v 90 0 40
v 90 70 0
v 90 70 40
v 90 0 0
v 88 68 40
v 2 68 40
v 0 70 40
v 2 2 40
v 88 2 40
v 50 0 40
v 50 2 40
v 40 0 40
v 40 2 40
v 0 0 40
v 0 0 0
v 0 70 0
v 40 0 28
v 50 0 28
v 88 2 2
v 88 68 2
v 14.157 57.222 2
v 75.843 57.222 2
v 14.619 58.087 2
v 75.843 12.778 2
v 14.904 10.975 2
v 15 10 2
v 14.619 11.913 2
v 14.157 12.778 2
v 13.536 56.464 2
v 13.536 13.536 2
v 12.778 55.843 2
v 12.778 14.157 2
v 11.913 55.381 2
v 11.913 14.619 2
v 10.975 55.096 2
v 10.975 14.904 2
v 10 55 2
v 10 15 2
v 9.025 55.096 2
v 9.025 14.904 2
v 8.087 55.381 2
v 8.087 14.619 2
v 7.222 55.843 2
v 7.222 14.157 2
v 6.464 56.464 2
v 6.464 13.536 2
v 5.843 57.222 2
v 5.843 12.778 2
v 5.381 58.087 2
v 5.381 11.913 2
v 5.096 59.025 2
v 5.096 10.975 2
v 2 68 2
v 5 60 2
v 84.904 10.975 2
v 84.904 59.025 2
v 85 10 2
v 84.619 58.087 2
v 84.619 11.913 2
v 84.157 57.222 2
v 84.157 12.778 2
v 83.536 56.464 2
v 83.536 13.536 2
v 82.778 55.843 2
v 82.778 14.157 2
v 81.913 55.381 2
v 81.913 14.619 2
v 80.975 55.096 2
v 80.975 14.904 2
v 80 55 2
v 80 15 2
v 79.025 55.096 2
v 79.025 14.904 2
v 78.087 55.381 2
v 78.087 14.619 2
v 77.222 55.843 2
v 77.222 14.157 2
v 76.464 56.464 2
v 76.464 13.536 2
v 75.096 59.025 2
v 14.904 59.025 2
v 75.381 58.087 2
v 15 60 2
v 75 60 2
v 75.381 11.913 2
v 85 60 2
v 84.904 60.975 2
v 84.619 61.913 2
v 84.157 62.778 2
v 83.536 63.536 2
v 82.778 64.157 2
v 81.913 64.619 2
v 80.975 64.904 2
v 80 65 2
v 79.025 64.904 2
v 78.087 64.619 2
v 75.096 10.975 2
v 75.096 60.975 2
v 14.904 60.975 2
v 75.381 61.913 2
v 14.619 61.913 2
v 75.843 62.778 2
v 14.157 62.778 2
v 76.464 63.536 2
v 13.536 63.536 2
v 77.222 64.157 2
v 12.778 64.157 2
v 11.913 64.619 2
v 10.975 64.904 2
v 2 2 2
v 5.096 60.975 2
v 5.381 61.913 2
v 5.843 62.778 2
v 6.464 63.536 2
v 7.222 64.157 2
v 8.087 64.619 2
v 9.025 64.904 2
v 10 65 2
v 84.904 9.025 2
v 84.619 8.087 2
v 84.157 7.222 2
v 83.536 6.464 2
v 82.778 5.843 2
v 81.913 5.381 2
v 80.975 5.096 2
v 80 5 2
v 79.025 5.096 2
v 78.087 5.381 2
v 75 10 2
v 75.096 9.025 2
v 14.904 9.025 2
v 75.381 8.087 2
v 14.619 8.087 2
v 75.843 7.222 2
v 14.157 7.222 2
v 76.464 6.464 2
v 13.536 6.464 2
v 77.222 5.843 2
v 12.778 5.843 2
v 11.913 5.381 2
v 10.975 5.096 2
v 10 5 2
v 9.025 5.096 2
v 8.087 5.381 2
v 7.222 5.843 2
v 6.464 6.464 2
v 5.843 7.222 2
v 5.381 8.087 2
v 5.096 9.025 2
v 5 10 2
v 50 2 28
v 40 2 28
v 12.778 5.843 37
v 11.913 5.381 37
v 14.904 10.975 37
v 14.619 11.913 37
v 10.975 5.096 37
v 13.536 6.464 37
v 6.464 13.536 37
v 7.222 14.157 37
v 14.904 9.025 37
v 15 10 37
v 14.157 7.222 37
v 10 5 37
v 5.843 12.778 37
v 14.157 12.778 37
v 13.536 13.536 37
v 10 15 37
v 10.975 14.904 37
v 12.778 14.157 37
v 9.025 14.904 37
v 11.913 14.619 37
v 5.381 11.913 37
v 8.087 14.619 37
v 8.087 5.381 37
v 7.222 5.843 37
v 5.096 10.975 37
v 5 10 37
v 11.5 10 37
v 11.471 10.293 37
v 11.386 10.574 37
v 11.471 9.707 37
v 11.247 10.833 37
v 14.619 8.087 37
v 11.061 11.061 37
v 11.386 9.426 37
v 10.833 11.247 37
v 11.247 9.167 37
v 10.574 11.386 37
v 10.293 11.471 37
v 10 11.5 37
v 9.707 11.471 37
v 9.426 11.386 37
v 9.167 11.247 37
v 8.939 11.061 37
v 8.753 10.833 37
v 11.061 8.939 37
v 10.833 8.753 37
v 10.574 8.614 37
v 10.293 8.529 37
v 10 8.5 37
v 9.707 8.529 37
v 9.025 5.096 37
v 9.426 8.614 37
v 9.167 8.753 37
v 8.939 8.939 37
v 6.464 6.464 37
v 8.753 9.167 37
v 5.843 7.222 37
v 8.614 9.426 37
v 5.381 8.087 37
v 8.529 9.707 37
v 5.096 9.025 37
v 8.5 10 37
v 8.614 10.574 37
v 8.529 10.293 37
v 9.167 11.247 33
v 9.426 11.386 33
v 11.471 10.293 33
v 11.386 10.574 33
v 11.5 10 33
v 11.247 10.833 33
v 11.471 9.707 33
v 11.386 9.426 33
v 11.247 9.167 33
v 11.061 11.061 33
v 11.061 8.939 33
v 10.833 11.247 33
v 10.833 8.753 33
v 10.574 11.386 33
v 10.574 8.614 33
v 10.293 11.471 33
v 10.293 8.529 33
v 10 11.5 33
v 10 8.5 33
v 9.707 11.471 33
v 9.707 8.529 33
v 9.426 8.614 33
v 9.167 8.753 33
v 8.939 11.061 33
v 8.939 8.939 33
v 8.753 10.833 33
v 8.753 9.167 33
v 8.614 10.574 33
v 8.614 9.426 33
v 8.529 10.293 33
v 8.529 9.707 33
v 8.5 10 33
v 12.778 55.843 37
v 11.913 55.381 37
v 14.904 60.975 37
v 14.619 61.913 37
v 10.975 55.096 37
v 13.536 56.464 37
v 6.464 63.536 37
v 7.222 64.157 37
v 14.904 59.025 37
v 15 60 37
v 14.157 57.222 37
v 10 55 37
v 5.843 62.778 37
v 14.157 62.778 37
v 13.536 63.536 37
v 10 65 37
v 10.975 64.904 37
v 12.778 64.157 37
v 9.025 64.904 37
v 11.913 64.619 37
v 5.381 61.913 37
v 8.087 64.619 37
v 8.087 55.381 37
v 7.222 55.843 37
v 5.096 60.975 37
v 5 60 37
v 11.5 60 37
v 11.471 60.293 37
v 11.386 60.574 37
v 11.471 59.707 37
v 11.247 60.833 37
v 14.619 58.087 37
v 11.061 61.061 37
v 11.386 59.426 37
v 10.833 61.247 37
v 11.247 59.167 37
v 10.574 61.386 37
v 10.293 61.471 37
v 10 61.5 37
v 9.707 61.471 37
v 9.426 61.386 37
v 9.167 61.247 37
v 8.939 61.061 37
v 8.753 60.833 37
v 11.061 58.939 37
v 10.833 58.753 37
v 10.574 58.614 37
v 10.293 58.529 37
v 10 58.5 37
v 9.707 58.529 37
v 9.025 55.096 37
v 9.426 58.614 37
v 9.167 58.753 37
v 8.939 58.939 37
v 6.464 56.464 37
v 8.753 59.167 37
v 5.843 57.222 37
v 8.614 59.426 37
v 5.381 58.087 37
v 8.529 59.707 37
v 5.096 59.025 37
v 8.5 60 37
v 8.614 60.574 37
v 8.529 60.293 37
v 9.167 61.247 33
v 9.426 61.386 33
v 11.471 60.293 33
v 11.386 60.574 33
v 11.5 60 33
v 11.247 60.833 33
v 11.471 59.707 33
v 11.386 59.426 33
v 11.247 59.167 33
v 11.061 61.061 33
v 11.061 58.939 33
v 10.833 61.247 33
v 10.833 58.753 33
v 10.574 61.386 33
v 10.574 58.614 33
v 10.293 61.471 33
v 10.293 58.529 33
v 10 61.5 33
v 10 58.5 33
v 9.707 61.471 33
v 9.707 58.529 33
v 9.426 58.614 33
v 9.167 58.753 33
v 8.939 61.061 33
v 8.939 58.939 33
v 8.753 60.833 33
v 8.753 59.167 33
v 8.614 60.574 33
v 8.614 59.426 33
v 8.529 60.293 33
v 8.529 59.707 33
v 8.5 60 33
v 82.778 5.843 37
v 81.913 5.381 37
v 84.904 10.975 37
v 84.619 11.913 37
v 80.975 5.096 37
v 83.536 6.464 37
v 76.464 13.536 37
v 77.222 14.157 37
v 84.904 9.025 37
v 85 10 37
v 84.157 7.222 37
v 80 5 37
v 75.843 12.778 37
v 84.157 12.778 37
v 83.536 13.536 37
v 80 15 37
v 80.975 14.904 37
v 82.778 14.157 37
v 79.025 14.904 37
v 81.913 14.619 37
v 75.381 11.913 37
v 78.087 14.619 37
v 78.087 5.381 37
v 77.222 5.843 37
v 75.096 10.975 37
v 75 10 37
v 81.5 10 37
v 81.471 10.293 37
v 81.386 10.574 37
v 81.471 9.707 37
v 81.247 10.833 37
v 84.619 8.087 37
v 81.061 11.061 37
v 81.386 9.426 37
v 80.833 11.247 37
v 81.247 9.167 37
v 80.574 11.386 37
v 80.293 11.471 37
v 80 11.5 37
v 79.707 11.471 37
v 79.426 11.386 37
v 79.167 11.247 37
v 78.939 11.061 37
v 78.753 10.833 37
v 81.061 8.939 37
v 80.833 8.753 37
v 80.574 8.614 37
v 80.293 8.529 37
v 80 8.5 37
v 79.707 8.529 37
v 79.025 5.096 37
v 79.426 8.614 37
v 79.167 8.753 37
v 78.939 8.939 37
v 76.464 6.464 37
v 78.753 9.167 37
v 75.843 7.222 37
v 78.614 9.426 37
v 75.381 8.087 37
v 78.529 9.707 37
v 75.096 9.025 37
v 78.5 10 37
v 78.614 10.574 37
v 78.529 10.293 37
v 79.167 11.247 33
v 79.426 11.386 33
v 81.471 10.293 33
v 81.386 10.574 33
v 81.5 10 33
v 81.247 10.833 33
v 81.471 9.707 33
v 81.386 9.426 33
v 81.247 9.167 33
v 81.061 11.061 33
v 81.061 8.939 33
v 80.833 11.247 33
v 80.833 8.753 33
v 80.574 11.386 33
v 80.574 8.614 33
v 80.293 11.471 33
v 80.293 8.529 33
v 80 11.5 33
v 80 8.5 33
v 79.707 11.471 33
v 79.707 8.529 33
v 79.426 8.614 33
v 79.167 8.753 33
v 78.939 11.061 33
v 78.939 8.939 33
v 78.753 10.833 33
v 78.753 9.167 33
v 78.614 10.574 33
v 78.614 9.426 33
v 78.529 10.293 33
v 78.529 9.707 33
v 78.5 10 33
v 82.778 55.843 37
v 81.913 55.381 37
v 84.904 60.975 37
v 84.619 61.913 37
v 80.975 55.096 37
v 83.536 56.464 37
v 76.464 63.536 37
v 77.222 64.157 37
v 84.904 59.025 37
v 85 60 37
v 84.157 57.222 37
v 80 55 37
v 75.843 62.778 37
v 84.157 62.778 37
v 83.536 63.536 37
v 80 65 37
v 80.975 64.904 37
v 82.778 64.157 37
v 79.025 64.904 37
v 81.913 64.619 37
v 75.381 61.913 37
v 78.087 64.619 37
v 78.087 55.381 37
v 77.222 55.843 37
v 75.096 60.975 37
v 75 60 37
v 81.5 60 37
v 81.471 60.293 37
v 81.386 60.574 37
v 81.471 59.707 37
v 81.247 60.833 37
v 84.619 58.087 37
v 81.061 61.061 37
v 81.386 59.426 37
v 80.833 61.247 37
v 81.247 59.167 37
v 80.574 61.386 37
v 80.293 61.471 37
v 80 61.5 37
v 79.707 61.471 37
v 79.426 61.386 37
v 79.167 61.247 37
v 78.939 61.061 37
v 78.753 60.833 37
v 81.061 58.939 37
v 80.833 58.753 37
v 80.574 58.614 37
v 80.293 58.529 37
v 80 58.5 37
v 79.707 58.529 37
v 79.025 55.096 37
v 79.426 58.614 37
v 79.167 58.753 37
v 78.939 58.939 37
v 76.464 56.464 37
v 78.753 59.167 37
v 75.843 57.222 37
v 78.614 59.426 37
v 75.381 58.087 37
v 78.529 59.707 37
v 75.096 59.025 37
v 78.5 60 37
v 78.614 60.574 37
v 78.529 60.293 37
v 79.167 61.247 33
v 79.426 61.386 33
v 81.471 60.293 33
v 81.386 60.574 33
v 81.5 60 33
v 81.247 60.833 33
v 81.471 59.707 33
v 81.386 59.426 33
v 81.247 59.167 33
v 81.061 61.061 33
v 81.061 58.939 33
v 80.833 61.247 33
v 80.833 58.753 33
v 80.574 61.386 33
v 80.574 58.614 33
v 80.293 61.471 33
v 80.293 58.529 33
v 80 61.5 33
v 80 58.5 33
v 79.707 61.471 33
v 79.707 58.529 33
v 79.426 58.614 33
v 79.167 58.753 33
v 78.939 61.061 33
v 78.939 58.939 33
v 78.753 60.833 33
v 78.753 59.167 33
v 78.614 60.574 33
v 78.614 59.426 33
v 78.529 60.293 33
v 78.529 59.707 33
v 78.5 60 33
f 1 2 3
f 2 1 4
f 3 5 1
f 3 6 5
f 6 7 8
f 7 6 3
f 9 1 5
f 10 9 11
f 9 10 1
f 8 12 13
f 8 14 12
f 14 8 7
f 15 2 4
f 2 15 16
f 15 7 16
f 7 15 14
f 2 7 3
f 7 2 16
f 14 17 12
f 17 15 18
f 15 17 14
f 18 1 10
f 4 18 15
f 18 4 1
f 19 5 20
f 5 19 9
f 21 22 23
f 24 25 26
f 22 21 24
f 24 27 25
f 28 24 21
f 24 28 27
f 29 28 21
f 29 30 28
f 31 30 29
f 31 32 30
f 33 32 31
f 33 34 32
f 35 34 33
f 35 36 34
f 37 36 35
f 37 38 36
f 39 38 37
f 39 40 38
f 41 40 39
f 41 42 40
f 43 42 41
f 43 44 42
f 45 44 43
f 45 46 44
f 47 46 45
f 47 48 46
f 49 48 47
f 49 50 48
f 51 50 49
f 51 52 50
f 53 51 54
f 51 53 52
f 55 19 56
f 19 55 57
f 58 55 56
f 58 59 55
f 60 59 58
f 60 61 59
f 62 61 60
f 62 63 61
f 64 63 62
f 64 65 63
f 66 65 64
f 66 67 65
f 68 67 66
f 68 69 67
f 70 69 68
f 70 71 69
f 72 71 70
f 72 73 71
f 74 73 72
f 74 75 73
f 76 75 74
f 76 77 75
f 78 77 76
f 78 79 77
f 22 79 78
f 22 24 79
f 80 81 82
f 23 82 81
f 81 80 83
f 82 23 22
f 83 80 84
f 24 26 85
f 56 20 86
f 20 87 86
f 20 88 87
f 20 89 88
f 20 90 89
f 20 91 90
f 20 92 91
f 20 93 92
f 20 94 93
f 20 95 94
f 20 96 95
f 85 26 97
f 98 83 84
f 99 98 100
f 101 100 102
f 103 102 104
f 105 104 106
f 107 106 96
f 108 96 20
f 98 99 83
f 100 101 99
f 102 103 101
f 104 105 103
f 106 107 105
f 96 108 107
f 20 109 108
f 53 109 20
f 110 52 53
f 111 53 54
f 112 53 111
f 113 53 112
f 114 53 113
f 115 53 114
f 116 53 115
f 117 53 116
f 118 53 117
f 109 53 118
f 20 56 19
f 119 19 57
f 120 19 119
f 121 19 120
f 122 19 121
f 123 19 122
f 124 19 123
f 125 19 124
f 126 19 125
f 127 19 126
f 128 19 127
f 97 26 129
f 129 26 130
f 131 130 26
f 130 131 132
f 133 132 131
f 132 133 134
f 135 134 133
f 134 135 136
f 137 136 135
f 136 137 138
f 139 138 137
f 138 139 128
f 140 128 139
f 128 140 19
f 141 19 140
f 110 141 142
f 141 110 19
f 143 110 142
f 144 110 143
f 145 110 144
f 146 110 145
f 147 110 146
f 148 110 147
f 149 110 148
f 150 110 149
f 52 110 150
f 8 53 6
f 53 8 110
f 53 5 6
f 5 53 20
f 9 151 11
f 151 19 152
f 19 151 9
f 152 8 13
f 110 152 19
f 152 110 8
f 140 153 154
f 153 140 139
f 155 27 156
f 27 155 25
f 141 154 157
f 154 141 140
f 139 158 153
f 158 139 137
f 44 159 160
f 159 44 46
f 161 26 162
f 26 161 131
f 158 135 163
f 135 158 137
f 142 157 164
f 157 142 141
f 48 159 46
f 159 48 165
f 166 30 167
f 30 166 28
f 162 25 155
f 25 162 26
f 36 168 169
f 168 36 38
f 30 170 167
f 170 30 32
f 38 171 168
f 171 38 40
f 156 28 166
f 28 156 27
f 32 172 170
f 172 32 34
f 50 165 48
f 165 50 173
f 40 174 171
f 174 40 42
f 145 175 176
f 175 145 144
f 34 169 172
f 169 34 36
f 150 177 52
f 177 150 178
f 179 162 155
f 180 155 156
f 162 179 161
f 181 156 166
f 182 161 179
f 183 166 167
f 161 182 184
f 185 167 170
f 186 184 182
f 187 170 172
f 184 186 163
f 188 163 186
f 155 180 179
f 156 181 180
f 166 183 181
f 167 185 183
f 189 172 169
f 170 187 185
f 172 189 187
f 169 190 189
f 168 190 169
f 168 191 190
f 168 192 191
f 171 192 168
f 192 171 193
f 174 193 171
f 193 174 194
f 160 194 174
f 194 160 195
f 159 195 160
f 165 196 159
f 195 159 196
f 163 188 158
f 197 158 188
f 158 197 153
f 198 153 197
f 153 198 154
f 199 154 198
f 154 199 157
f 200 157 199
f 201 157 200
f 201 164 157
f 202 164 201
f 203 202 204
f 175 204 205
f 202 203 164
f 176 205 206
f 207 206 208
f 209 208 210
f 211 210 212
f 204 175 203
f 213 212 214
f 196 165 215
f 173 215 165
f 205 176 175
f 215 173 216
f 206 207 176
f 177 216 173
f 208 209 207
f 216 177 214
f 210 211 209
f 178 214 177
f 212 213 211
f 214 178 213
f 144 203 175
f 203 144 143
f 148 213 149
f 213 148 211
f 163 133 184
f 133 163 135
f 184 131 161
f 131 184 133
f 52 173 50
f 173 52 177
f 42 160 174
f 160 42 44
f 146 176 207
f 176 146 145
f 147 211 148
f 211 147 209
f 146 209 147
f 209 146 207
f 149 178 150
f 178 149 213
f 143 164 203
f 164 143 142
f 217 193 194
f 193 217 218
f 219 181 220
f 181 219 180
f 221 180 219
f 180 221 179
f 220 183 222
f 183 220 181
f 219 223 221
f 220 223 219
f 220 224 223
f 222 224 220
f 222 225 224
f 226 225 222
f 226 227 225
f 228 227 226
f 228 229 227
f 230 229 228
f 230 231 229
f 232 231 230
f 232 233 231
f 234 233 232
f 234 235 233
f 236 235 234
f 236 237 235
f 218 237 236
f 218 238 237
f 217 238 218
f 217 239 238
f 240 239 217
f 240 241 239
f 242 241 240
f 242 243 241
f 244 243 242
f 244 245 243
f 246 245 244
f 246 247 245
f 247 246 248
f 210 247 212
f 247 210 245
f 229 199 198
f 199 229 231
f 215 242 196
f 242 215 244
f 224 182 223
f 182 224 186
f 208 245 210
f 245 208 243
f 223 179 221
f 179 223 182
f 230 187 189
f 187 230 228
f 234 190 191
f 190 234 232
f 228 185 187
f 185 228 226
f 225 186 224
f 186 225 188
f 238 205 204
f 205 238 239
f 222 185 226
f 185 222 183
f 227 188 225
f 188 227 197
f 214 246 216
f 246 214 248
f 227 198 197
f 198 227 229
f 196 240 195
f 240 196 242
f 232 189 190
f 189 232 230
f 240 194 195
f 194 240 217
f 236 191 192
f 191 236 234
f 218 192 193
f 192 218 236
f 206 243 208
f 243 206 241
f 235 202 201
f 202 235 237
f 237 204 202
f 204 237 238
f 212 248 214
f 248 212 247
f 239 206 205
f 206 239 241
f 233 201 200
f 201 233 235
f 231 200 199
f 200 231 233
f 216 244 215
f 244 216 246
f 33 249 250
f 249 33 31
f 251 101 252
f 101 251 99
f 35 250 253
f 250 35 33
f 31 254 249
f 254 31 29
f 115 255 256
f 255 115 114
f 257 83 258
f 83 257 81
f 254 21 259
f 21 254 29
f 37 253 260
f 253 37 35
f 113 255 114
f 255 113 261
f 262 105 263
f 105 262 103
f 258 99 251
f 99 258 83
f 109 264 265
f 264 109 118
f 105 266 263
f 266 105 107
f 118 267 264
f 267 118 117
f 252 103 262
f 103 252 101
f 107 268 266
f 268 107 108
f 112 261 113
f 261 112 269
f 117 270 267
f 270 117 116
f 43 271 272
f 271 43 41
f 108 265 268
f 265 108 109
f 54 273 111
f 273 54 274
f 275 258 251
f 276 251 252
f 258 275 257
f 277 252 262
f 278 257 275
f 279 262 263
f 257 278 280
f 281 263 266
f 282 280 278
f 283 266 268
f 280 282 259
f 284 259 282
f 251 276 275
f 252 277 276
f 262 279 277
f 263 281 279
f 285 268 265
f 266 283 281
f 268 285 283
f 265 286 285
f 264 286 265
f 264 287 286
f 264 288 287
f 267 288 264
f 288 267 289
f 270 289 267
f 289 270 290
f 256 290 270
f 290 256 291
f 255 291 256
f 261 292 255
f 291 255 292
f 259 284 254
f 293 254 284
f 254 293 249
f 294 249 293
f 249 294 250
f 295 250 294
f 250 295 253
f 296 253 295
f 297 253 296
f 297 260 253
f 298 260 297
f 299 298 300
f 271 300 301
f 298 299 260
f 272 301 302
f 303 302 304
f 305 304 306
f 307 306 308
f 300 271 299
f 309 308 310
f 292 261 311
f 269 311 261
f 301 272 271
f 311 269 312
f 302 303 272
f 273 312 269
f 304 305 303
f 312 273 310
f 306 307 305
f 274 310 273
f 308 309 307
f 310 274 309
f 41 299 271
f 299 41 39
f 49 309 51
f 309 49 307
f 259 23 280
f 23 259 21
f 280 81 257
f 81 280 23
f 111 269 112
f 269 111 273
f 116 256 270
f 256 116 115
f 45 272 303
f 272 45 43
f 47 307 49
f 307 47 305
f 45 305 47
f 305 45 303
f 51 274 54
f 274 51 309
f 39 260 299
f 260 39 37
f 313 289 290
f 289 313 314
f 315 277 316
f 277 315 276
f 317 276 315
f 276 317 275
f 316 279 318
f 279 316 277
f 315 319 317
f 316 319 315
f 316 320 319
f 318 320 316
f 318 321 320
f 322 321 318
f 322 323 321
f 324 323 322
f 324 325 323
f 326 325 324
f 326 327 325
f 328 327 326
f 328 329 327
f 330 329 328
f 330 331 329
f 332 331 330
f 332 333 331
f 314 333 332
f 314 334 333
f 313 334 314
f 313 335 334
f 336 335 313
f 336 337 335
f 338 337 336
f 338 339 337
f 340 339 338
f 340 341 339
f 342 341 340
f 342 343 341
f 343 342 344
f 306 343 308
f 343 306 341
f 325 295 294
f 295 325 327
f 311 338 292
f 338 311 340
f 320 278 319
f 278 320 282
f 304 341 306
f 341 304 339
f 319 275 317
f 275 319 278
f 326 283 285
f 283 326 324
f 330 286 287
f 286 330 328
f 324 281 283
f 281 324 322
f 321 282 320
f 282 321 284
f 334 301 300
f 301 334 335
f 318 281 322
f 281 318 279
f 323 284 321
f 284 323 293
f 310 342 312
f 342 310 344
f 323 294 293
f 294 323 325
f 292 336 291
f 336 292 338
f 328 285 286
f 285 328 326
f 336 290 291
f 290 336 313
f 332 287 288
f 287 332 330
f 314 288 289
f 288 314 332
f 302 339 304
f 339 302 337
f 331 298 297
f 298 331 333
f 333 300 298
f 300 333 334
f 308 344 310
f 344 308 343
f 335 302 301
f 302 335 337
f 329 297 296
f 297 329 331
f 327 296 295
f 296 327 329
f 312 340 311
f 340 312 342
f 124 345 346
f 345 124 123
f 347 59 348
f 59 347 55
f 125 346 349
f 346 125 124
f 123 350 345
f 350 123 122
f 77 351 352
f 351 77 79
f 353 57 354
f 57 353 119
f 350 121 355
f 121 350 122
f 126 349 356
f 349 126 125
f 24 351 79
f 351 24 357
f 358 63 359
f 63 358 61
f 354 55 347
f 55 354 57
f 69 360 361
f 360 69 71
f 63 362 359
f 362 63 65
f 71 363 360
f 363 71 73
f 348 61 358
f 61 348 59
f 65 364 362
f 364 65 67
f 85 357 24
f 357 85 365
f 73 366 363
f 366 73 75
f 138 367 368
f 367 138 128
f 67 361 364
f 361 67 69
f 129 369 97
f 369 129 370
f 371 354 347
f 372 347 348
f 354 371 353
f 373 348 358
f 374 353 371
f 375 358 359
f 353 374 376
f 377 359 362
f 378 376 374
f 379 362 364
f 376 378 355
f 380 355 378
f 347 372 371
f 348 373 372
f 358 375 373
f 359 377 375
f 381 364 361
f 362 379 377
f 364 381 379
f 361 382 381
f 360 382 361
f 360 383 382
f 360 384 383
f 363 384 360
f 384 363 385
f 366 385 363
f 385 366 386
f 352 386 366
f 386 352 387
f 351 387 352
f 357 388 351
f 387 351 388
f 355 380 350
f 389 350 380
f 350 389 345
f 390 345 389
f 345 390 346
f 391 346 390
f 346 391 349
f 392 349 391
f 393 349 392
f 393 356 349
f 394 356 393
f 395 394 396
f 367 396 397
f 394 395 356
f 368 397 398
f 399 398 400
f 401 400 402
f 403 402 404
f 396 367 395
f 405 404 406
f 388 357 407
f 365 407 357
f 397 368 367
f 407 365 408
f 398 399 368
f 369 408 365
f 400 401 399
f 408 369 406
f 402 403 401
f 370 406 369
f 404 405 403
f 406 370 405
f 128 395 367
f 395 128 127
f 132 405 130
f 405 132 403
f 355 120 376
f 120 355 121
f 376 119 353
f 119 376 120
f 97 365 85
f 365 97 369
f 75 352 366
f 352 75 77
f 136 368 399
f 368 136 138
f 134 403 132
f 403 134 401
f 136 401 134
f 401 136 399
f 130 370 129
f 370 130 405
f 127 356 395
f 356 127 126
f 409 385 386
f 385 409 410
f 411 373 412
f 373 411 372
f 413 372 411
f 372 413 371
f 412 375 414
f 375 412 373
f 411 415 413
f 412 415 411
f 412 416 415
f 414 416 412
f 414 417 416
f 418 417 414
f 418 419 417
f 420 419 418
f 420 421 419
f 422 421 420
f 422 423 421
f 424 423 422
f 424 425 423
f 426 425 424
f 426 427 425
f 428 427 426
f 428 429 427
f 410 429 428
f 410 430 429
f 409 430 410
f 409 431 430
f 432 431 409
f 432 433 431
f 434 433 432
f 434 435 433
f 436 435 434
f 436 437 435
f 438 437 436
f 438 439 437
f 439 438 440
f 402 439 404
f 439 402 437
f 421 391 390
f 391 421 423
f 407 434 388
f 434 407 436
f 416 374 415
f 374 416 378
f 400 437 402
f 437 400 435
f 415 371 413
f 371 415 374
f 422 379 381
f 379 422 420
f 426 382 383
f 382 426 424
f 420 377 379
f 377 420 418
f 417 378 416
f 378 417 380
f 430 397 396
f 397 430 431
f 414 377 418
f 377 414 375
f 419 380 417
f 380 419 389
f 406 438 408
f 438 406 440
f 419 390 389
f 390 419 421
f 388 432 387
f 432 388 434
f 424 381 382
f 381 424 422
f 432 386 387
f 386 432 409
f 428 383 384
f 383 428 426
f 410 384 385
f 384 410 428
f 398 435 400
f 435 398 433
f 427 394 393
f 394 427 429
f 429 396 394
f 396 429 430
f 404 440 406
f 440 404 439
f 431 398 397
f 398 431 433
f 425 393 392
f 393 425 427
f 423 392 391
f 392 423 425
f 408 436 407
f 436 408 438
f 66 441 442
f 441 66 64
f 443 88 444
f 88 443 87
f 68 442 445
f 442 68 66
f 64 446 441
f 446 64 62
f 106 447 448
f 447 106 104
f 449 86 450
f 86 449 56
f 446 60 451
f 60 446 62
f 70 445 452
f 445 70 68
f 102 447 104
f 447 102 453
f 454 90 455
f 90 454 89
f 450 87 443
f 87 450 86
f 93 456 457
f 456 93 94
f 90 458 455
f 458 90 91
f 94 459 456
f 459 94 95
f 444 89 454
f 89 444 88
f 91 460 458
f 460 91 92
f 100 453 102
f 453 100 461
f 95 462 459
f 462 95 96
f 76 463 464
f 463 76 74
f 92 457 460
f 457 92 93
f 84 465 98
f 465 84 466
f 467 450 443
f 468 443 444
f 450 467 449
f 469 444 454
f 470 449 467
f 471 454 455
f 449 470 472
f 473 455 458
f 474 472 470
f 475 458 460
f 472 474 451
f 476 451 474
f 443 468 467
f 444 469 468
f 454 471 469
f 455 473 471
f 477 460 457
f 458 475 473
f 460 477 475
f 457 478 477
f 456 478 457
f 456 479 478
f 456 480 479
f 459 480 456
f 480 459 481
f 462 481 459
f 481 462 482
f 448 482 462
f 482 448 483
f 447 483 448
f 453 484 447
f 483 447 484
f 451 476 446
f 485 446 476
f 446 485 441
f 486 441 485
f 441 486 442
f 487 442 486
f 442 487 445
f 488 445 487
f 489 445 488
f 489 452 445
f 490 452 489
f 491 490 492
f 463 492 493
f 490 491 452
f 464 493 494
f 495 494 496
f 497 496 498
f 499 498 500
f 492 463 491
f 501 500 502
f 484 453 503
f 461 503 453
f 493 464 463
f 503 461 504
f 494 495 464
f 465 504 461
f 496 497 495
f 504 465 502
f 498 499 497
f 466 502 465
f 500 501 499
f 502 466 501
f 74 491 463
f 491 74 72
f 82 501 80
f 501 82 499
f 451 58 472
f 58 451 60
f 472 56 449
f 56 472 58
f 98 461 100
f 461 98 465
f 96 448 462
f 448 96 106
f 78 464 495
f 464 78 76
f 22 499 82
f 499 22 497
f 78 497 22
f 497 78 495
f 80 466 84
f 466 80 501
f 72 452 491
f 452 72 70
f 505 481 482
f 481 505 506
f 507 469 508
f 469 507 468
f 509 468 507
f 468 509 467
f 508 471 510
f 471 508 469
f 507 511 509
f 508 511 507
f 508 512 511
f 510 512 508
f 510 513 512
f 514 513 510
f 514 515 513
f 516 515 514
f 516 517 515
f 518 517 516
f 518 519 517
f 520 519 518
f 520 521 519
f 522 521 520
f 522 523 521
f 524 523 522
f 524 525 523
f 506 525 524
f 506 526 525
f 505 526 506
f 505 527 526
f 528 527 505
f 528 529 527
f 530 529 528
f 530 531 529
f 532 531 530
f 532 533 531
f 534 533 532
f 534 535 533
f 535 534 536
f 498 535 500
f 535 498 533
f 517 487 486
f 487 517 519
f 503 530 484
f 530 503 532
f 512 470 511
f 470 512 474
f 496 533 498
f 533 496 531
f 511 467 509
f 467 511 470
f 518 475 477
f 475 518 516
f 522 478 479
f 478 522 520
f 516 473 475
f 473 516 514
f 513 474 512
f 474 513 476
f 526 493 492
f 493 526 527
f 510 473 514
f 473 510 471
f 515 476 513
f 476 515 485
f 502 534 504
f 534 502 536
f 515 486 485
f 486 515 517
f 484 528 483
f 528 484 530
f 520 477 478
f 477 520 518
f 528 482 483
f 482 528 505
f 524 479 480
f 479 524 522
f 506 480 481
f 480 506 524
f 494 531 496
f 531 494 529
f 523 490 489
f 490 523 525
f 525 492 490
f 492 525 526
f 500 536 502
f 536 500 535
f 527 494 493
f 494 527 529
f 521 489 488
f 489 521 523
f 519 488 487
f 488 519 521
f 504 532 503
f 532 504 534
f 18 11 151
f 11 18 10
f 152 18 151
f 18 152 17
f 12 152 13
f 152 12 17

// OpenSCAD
$fn = 32;

// ----------------------------------------------------------------------
// Enclosure box: both enclosure
// ----------------------------------------------------------------------

// --- parameters (mm) ---
box_l = 90;               // outer length, X
box_w = 70;               // outer width, Y
box_h = 40;               // outer height
wall_t = 2;               // wall thickness
boss_r = 5;               // corner boss radius
hole_r = 1.5;             // boss screw hole radius
boss_in = 10;             // boss inset from the corners
notch_w = 10;             // cable notch width
notch_h = 12;             // cable notch height
fit_tol = 0.1;            // tolerance for press fits, mm
free_tol = 0.5;           // tolerance for clearance fits, mm

inner_h = box_h - wall_t;  // cavity depth
boss_h = inner_h - 2;  // corner boss height

difference() {
  union() {
    difference() {
      cube([box_l, box_w, box_h]);
      translate([wall_t, wall_t, wall_t])
        cube([box_l - 2 * wall_t, box_w - 2 * wall_t, box_h]);
    }
    for (sx = [0, 1], sy = [0, 1])
      translate([sx ? box_l - boss_in : boss_in,
                 sy ? box_w - boss_in : boss_in, wall_t - 1])
        difference() {
          cylinder(r = boss_r, h = boss_h);
          translate([0, 0, boss_h - 4])
            cylinder(r = hole_r, h = 5);
        }
  }
  translate([box_l / 2 - notch_w / 2, -1, box_h - notch_h])
    cube([notch_w, wall_t + 2, notch_h + 1]);
}
